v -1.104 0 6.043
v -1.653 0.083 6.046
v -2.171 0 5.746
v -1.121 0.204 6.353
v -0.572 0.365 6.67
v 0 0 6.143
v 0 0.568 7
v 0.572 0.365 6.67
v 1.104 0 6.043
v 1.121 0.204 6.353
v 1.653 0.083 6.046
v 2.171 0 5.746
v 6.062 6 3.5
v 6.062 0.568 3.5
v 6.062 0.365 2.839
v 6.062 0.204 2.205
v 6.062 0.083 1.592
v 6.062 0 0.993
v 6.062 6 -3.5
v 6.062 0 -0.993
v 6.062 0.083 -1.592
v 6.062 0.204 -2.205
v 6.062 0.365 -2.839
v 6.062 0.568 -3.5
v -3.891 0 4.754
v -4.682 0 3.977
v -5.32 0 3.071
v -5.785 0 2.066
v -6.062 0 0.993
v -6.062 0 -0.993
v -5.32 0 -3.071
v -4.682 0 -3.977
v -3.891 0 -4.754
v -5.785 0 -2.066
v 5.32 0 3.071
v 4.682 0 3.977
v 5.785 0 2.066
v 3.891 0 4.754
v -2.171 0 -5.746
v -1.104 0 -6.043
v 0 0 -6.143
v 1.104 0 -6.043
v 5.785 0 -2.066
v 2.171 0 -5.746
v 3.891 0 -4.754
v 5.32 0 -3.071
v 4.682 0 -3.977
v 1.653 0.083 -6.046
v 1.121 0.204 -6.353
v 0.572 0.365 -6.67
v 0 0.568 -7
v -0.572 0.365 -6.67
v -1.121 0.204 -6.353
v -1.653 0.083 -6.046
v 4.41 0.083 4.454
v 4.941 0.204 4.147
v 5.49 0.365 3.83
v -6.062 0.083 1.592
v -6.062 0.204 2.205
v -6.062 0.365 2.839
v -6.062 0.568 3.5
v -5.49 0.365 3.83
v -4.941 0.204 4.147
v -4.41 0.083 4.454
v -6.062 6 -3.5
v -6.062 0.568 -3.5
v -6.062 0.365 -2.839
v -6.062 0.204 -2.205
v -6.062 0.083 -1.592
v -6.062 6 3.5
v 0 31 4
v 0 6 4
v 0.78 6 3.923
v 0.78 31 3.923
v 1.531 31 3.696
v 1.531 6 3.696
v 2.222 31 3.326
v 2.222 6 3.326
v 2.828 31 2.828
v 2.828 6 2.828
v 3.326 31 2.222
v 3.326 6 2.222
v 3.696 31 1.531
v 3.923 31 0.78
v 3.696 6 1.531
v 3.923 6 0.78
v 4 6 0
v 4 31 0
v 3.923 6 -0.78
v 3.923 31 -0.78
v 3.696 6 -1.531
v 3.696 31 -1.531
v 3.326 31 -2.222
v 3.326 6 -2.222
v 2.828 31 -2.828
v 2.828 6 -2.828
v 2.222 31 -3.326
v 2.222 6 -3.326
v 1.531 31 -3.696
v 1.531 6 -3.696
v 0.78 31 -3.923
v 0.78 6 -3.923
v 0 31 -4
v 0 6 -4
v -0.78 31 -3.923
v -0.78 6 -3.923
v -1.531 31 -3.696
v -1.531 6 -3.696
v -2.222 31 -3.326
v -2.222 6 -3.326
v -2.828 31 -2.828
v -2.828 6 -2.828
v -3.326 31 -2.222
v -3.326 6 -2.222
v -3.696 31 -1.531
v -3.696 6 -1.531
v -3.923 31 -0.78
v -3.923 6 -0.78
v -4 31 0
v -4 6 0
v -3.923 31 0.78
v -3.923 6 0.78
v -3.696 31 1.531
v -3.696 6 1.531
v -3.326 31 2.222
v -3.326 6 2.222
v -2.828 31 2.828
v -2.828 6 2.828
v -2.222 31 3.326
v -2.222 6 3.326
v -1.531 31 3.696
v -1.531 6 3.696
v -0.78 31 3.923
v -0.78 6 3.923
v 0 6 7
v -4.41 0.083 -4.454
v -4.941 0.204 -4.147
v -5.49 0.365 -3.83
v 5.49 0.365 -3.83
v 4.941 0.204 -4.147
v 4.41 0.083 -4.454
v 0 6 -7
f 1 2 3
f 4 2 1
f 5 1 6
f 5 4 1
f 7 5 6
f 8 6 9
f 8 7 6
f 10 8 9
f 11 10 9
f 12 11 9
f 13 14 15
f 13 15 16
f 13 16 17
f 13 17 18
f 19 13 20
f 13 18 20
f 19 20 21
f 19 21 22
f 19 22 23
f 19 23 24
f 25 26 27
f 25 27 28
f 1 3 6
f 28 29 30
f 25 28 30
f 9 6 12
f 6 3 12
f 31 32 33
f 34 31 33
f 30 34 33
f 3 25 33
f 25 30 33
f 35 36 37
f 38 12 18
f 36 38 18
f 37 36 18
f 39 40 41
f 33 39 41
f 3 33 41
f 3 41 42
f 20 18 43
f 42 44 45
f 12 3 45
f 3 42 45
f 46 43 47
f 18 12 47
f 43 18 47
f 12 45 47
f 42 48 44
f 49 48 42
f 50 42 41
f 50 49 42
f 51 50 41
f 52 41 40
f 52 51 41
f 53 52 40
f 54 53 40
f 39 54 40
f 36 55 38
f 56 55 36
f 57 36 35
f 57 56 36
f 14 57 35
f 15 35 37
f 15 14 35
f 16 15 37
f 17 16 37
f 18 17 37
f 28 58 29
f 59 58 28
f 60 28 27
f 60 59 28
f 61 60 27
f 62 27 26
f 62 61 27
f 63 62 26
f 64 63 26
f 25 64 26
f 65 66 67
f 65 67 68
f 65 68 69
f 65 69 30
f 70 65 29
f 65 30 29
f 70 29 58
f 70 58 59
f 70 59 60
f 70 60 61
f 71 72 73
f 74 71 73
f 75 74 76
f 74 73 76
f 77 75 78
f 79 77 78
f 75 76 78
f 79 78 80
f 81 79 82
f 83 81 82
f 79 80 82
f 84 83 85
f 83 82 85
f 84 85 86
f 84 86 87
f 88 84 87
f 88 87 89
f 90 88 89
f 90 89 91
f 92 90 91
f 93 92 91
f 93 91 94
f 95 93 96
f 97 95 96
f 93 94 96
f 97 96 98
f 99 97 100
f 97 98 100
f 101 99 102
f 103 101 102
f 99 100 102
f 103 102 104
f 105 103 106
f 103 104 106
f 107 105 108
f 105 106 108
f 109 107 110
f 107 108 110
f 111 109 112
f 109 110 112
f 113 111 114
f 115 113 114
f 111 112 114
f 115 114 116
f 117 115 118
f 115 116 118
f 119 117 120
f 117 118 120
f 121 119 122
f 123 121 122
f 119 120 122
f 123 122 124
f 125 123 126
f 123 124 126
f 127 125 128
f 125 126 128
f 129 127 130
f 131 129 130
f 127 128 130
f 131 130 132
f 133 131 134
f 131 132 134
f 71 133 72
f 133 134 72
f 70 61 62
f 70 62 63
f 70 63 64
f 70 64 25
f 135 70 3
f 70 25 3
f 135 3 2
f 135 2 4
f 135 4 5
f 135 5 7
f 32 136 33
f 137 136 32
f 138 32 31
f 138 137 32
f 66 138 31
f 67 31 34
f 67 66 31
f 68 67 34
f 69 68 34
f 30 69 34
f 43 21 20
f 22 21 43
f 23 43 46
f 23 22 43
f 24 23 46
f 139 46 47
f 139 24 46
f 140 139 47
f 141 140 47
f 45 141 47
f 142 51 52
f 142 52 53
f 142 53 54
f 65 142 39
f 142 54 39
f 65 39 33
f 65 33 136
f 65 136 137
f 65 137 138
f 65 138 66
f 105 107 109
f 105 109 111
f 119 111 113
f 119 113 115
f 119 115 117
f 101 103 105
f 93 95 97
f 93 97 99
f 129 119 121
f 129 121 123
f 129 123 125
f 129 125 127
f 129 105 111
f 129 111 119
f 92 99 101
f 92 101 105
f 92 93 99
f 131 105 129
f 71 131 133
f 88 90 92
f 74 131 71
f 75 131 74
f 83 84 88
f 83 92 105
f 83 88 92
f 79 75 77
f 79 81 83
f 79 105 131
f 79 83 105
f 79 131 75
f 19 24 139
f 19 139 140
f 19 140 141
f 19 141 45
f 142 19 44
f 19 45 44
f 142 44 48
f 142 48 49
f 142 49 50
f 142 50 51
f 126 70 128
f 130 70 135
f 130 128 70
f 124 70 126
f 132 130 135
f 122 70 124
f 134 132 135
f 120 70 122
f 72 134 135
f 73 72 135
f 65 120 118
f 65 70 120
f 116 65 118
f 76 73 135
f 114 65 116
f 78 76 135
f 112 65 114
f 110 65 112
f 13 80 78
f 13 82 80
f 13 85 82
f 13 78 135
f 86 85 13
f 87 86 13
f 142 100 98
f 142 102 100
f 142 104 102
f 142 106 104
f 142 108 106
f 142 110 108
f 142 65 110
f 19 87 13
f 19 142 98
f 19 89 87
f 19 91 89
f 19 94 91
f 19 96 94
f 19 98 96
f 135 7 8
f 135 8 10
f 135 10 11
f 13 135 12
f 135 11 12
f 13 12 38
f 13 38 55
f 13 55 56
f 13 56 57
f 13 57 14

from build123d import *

# Parameters (mm, degrees)
BOSS_EXTRUDE1_DEPTH = 6
SKETCH6_R           = 4
BOSS_EXTRUDE2_DEPTH = 25


with BuildPart() as part:
    # Sketch1 → Boss-Extrude1 (new body)
    with BuildSketch(Plane(origin=(0, 0, 0), x_dir=(1, 0, 0), z_dir=(0, 1, 0))):
        Polygon((6.062177826, 3.5), (0, 7), (-6.062177826, 3.5), (-6.062177826, -3.5), (0, -7), (6.062177826, -3.5), align=None)
    extrude(amount=BOSS_EXTRUDE1_DEPTH)

    # Sketch5 → Cut-Revolve5 (revolve, cut)
    with BuildSketch(Plane(origin=(0, 0, 0), x_dir=(0, 0, -1), z_dir=(1, 0, 0))):
        Polygon((5.527622028, -0.407756563), (7.359129526, 0.805892984), (7.359129526, -0.407756563), align=None)
    revolve(axis=Axis((0, 0, 0), (0, 1, 0)), mode=Mode.SUBTRACT)

    # Sketch6 → Boss-Extrude2 (add)
    with BuildSketch(Plane(origin=(0, 6, 0), x_dir=(1, 0, 0), z_dir=(0, 1, 0))):
        with Locations(Location((0, 0, 0), (0, 0, 270))):  # turned: the seam where the file's is
            Circle(SKETCH6_R)
    extrude(amount=BOSS_EXTRUDE2_DEPTH)


solid = part.part
